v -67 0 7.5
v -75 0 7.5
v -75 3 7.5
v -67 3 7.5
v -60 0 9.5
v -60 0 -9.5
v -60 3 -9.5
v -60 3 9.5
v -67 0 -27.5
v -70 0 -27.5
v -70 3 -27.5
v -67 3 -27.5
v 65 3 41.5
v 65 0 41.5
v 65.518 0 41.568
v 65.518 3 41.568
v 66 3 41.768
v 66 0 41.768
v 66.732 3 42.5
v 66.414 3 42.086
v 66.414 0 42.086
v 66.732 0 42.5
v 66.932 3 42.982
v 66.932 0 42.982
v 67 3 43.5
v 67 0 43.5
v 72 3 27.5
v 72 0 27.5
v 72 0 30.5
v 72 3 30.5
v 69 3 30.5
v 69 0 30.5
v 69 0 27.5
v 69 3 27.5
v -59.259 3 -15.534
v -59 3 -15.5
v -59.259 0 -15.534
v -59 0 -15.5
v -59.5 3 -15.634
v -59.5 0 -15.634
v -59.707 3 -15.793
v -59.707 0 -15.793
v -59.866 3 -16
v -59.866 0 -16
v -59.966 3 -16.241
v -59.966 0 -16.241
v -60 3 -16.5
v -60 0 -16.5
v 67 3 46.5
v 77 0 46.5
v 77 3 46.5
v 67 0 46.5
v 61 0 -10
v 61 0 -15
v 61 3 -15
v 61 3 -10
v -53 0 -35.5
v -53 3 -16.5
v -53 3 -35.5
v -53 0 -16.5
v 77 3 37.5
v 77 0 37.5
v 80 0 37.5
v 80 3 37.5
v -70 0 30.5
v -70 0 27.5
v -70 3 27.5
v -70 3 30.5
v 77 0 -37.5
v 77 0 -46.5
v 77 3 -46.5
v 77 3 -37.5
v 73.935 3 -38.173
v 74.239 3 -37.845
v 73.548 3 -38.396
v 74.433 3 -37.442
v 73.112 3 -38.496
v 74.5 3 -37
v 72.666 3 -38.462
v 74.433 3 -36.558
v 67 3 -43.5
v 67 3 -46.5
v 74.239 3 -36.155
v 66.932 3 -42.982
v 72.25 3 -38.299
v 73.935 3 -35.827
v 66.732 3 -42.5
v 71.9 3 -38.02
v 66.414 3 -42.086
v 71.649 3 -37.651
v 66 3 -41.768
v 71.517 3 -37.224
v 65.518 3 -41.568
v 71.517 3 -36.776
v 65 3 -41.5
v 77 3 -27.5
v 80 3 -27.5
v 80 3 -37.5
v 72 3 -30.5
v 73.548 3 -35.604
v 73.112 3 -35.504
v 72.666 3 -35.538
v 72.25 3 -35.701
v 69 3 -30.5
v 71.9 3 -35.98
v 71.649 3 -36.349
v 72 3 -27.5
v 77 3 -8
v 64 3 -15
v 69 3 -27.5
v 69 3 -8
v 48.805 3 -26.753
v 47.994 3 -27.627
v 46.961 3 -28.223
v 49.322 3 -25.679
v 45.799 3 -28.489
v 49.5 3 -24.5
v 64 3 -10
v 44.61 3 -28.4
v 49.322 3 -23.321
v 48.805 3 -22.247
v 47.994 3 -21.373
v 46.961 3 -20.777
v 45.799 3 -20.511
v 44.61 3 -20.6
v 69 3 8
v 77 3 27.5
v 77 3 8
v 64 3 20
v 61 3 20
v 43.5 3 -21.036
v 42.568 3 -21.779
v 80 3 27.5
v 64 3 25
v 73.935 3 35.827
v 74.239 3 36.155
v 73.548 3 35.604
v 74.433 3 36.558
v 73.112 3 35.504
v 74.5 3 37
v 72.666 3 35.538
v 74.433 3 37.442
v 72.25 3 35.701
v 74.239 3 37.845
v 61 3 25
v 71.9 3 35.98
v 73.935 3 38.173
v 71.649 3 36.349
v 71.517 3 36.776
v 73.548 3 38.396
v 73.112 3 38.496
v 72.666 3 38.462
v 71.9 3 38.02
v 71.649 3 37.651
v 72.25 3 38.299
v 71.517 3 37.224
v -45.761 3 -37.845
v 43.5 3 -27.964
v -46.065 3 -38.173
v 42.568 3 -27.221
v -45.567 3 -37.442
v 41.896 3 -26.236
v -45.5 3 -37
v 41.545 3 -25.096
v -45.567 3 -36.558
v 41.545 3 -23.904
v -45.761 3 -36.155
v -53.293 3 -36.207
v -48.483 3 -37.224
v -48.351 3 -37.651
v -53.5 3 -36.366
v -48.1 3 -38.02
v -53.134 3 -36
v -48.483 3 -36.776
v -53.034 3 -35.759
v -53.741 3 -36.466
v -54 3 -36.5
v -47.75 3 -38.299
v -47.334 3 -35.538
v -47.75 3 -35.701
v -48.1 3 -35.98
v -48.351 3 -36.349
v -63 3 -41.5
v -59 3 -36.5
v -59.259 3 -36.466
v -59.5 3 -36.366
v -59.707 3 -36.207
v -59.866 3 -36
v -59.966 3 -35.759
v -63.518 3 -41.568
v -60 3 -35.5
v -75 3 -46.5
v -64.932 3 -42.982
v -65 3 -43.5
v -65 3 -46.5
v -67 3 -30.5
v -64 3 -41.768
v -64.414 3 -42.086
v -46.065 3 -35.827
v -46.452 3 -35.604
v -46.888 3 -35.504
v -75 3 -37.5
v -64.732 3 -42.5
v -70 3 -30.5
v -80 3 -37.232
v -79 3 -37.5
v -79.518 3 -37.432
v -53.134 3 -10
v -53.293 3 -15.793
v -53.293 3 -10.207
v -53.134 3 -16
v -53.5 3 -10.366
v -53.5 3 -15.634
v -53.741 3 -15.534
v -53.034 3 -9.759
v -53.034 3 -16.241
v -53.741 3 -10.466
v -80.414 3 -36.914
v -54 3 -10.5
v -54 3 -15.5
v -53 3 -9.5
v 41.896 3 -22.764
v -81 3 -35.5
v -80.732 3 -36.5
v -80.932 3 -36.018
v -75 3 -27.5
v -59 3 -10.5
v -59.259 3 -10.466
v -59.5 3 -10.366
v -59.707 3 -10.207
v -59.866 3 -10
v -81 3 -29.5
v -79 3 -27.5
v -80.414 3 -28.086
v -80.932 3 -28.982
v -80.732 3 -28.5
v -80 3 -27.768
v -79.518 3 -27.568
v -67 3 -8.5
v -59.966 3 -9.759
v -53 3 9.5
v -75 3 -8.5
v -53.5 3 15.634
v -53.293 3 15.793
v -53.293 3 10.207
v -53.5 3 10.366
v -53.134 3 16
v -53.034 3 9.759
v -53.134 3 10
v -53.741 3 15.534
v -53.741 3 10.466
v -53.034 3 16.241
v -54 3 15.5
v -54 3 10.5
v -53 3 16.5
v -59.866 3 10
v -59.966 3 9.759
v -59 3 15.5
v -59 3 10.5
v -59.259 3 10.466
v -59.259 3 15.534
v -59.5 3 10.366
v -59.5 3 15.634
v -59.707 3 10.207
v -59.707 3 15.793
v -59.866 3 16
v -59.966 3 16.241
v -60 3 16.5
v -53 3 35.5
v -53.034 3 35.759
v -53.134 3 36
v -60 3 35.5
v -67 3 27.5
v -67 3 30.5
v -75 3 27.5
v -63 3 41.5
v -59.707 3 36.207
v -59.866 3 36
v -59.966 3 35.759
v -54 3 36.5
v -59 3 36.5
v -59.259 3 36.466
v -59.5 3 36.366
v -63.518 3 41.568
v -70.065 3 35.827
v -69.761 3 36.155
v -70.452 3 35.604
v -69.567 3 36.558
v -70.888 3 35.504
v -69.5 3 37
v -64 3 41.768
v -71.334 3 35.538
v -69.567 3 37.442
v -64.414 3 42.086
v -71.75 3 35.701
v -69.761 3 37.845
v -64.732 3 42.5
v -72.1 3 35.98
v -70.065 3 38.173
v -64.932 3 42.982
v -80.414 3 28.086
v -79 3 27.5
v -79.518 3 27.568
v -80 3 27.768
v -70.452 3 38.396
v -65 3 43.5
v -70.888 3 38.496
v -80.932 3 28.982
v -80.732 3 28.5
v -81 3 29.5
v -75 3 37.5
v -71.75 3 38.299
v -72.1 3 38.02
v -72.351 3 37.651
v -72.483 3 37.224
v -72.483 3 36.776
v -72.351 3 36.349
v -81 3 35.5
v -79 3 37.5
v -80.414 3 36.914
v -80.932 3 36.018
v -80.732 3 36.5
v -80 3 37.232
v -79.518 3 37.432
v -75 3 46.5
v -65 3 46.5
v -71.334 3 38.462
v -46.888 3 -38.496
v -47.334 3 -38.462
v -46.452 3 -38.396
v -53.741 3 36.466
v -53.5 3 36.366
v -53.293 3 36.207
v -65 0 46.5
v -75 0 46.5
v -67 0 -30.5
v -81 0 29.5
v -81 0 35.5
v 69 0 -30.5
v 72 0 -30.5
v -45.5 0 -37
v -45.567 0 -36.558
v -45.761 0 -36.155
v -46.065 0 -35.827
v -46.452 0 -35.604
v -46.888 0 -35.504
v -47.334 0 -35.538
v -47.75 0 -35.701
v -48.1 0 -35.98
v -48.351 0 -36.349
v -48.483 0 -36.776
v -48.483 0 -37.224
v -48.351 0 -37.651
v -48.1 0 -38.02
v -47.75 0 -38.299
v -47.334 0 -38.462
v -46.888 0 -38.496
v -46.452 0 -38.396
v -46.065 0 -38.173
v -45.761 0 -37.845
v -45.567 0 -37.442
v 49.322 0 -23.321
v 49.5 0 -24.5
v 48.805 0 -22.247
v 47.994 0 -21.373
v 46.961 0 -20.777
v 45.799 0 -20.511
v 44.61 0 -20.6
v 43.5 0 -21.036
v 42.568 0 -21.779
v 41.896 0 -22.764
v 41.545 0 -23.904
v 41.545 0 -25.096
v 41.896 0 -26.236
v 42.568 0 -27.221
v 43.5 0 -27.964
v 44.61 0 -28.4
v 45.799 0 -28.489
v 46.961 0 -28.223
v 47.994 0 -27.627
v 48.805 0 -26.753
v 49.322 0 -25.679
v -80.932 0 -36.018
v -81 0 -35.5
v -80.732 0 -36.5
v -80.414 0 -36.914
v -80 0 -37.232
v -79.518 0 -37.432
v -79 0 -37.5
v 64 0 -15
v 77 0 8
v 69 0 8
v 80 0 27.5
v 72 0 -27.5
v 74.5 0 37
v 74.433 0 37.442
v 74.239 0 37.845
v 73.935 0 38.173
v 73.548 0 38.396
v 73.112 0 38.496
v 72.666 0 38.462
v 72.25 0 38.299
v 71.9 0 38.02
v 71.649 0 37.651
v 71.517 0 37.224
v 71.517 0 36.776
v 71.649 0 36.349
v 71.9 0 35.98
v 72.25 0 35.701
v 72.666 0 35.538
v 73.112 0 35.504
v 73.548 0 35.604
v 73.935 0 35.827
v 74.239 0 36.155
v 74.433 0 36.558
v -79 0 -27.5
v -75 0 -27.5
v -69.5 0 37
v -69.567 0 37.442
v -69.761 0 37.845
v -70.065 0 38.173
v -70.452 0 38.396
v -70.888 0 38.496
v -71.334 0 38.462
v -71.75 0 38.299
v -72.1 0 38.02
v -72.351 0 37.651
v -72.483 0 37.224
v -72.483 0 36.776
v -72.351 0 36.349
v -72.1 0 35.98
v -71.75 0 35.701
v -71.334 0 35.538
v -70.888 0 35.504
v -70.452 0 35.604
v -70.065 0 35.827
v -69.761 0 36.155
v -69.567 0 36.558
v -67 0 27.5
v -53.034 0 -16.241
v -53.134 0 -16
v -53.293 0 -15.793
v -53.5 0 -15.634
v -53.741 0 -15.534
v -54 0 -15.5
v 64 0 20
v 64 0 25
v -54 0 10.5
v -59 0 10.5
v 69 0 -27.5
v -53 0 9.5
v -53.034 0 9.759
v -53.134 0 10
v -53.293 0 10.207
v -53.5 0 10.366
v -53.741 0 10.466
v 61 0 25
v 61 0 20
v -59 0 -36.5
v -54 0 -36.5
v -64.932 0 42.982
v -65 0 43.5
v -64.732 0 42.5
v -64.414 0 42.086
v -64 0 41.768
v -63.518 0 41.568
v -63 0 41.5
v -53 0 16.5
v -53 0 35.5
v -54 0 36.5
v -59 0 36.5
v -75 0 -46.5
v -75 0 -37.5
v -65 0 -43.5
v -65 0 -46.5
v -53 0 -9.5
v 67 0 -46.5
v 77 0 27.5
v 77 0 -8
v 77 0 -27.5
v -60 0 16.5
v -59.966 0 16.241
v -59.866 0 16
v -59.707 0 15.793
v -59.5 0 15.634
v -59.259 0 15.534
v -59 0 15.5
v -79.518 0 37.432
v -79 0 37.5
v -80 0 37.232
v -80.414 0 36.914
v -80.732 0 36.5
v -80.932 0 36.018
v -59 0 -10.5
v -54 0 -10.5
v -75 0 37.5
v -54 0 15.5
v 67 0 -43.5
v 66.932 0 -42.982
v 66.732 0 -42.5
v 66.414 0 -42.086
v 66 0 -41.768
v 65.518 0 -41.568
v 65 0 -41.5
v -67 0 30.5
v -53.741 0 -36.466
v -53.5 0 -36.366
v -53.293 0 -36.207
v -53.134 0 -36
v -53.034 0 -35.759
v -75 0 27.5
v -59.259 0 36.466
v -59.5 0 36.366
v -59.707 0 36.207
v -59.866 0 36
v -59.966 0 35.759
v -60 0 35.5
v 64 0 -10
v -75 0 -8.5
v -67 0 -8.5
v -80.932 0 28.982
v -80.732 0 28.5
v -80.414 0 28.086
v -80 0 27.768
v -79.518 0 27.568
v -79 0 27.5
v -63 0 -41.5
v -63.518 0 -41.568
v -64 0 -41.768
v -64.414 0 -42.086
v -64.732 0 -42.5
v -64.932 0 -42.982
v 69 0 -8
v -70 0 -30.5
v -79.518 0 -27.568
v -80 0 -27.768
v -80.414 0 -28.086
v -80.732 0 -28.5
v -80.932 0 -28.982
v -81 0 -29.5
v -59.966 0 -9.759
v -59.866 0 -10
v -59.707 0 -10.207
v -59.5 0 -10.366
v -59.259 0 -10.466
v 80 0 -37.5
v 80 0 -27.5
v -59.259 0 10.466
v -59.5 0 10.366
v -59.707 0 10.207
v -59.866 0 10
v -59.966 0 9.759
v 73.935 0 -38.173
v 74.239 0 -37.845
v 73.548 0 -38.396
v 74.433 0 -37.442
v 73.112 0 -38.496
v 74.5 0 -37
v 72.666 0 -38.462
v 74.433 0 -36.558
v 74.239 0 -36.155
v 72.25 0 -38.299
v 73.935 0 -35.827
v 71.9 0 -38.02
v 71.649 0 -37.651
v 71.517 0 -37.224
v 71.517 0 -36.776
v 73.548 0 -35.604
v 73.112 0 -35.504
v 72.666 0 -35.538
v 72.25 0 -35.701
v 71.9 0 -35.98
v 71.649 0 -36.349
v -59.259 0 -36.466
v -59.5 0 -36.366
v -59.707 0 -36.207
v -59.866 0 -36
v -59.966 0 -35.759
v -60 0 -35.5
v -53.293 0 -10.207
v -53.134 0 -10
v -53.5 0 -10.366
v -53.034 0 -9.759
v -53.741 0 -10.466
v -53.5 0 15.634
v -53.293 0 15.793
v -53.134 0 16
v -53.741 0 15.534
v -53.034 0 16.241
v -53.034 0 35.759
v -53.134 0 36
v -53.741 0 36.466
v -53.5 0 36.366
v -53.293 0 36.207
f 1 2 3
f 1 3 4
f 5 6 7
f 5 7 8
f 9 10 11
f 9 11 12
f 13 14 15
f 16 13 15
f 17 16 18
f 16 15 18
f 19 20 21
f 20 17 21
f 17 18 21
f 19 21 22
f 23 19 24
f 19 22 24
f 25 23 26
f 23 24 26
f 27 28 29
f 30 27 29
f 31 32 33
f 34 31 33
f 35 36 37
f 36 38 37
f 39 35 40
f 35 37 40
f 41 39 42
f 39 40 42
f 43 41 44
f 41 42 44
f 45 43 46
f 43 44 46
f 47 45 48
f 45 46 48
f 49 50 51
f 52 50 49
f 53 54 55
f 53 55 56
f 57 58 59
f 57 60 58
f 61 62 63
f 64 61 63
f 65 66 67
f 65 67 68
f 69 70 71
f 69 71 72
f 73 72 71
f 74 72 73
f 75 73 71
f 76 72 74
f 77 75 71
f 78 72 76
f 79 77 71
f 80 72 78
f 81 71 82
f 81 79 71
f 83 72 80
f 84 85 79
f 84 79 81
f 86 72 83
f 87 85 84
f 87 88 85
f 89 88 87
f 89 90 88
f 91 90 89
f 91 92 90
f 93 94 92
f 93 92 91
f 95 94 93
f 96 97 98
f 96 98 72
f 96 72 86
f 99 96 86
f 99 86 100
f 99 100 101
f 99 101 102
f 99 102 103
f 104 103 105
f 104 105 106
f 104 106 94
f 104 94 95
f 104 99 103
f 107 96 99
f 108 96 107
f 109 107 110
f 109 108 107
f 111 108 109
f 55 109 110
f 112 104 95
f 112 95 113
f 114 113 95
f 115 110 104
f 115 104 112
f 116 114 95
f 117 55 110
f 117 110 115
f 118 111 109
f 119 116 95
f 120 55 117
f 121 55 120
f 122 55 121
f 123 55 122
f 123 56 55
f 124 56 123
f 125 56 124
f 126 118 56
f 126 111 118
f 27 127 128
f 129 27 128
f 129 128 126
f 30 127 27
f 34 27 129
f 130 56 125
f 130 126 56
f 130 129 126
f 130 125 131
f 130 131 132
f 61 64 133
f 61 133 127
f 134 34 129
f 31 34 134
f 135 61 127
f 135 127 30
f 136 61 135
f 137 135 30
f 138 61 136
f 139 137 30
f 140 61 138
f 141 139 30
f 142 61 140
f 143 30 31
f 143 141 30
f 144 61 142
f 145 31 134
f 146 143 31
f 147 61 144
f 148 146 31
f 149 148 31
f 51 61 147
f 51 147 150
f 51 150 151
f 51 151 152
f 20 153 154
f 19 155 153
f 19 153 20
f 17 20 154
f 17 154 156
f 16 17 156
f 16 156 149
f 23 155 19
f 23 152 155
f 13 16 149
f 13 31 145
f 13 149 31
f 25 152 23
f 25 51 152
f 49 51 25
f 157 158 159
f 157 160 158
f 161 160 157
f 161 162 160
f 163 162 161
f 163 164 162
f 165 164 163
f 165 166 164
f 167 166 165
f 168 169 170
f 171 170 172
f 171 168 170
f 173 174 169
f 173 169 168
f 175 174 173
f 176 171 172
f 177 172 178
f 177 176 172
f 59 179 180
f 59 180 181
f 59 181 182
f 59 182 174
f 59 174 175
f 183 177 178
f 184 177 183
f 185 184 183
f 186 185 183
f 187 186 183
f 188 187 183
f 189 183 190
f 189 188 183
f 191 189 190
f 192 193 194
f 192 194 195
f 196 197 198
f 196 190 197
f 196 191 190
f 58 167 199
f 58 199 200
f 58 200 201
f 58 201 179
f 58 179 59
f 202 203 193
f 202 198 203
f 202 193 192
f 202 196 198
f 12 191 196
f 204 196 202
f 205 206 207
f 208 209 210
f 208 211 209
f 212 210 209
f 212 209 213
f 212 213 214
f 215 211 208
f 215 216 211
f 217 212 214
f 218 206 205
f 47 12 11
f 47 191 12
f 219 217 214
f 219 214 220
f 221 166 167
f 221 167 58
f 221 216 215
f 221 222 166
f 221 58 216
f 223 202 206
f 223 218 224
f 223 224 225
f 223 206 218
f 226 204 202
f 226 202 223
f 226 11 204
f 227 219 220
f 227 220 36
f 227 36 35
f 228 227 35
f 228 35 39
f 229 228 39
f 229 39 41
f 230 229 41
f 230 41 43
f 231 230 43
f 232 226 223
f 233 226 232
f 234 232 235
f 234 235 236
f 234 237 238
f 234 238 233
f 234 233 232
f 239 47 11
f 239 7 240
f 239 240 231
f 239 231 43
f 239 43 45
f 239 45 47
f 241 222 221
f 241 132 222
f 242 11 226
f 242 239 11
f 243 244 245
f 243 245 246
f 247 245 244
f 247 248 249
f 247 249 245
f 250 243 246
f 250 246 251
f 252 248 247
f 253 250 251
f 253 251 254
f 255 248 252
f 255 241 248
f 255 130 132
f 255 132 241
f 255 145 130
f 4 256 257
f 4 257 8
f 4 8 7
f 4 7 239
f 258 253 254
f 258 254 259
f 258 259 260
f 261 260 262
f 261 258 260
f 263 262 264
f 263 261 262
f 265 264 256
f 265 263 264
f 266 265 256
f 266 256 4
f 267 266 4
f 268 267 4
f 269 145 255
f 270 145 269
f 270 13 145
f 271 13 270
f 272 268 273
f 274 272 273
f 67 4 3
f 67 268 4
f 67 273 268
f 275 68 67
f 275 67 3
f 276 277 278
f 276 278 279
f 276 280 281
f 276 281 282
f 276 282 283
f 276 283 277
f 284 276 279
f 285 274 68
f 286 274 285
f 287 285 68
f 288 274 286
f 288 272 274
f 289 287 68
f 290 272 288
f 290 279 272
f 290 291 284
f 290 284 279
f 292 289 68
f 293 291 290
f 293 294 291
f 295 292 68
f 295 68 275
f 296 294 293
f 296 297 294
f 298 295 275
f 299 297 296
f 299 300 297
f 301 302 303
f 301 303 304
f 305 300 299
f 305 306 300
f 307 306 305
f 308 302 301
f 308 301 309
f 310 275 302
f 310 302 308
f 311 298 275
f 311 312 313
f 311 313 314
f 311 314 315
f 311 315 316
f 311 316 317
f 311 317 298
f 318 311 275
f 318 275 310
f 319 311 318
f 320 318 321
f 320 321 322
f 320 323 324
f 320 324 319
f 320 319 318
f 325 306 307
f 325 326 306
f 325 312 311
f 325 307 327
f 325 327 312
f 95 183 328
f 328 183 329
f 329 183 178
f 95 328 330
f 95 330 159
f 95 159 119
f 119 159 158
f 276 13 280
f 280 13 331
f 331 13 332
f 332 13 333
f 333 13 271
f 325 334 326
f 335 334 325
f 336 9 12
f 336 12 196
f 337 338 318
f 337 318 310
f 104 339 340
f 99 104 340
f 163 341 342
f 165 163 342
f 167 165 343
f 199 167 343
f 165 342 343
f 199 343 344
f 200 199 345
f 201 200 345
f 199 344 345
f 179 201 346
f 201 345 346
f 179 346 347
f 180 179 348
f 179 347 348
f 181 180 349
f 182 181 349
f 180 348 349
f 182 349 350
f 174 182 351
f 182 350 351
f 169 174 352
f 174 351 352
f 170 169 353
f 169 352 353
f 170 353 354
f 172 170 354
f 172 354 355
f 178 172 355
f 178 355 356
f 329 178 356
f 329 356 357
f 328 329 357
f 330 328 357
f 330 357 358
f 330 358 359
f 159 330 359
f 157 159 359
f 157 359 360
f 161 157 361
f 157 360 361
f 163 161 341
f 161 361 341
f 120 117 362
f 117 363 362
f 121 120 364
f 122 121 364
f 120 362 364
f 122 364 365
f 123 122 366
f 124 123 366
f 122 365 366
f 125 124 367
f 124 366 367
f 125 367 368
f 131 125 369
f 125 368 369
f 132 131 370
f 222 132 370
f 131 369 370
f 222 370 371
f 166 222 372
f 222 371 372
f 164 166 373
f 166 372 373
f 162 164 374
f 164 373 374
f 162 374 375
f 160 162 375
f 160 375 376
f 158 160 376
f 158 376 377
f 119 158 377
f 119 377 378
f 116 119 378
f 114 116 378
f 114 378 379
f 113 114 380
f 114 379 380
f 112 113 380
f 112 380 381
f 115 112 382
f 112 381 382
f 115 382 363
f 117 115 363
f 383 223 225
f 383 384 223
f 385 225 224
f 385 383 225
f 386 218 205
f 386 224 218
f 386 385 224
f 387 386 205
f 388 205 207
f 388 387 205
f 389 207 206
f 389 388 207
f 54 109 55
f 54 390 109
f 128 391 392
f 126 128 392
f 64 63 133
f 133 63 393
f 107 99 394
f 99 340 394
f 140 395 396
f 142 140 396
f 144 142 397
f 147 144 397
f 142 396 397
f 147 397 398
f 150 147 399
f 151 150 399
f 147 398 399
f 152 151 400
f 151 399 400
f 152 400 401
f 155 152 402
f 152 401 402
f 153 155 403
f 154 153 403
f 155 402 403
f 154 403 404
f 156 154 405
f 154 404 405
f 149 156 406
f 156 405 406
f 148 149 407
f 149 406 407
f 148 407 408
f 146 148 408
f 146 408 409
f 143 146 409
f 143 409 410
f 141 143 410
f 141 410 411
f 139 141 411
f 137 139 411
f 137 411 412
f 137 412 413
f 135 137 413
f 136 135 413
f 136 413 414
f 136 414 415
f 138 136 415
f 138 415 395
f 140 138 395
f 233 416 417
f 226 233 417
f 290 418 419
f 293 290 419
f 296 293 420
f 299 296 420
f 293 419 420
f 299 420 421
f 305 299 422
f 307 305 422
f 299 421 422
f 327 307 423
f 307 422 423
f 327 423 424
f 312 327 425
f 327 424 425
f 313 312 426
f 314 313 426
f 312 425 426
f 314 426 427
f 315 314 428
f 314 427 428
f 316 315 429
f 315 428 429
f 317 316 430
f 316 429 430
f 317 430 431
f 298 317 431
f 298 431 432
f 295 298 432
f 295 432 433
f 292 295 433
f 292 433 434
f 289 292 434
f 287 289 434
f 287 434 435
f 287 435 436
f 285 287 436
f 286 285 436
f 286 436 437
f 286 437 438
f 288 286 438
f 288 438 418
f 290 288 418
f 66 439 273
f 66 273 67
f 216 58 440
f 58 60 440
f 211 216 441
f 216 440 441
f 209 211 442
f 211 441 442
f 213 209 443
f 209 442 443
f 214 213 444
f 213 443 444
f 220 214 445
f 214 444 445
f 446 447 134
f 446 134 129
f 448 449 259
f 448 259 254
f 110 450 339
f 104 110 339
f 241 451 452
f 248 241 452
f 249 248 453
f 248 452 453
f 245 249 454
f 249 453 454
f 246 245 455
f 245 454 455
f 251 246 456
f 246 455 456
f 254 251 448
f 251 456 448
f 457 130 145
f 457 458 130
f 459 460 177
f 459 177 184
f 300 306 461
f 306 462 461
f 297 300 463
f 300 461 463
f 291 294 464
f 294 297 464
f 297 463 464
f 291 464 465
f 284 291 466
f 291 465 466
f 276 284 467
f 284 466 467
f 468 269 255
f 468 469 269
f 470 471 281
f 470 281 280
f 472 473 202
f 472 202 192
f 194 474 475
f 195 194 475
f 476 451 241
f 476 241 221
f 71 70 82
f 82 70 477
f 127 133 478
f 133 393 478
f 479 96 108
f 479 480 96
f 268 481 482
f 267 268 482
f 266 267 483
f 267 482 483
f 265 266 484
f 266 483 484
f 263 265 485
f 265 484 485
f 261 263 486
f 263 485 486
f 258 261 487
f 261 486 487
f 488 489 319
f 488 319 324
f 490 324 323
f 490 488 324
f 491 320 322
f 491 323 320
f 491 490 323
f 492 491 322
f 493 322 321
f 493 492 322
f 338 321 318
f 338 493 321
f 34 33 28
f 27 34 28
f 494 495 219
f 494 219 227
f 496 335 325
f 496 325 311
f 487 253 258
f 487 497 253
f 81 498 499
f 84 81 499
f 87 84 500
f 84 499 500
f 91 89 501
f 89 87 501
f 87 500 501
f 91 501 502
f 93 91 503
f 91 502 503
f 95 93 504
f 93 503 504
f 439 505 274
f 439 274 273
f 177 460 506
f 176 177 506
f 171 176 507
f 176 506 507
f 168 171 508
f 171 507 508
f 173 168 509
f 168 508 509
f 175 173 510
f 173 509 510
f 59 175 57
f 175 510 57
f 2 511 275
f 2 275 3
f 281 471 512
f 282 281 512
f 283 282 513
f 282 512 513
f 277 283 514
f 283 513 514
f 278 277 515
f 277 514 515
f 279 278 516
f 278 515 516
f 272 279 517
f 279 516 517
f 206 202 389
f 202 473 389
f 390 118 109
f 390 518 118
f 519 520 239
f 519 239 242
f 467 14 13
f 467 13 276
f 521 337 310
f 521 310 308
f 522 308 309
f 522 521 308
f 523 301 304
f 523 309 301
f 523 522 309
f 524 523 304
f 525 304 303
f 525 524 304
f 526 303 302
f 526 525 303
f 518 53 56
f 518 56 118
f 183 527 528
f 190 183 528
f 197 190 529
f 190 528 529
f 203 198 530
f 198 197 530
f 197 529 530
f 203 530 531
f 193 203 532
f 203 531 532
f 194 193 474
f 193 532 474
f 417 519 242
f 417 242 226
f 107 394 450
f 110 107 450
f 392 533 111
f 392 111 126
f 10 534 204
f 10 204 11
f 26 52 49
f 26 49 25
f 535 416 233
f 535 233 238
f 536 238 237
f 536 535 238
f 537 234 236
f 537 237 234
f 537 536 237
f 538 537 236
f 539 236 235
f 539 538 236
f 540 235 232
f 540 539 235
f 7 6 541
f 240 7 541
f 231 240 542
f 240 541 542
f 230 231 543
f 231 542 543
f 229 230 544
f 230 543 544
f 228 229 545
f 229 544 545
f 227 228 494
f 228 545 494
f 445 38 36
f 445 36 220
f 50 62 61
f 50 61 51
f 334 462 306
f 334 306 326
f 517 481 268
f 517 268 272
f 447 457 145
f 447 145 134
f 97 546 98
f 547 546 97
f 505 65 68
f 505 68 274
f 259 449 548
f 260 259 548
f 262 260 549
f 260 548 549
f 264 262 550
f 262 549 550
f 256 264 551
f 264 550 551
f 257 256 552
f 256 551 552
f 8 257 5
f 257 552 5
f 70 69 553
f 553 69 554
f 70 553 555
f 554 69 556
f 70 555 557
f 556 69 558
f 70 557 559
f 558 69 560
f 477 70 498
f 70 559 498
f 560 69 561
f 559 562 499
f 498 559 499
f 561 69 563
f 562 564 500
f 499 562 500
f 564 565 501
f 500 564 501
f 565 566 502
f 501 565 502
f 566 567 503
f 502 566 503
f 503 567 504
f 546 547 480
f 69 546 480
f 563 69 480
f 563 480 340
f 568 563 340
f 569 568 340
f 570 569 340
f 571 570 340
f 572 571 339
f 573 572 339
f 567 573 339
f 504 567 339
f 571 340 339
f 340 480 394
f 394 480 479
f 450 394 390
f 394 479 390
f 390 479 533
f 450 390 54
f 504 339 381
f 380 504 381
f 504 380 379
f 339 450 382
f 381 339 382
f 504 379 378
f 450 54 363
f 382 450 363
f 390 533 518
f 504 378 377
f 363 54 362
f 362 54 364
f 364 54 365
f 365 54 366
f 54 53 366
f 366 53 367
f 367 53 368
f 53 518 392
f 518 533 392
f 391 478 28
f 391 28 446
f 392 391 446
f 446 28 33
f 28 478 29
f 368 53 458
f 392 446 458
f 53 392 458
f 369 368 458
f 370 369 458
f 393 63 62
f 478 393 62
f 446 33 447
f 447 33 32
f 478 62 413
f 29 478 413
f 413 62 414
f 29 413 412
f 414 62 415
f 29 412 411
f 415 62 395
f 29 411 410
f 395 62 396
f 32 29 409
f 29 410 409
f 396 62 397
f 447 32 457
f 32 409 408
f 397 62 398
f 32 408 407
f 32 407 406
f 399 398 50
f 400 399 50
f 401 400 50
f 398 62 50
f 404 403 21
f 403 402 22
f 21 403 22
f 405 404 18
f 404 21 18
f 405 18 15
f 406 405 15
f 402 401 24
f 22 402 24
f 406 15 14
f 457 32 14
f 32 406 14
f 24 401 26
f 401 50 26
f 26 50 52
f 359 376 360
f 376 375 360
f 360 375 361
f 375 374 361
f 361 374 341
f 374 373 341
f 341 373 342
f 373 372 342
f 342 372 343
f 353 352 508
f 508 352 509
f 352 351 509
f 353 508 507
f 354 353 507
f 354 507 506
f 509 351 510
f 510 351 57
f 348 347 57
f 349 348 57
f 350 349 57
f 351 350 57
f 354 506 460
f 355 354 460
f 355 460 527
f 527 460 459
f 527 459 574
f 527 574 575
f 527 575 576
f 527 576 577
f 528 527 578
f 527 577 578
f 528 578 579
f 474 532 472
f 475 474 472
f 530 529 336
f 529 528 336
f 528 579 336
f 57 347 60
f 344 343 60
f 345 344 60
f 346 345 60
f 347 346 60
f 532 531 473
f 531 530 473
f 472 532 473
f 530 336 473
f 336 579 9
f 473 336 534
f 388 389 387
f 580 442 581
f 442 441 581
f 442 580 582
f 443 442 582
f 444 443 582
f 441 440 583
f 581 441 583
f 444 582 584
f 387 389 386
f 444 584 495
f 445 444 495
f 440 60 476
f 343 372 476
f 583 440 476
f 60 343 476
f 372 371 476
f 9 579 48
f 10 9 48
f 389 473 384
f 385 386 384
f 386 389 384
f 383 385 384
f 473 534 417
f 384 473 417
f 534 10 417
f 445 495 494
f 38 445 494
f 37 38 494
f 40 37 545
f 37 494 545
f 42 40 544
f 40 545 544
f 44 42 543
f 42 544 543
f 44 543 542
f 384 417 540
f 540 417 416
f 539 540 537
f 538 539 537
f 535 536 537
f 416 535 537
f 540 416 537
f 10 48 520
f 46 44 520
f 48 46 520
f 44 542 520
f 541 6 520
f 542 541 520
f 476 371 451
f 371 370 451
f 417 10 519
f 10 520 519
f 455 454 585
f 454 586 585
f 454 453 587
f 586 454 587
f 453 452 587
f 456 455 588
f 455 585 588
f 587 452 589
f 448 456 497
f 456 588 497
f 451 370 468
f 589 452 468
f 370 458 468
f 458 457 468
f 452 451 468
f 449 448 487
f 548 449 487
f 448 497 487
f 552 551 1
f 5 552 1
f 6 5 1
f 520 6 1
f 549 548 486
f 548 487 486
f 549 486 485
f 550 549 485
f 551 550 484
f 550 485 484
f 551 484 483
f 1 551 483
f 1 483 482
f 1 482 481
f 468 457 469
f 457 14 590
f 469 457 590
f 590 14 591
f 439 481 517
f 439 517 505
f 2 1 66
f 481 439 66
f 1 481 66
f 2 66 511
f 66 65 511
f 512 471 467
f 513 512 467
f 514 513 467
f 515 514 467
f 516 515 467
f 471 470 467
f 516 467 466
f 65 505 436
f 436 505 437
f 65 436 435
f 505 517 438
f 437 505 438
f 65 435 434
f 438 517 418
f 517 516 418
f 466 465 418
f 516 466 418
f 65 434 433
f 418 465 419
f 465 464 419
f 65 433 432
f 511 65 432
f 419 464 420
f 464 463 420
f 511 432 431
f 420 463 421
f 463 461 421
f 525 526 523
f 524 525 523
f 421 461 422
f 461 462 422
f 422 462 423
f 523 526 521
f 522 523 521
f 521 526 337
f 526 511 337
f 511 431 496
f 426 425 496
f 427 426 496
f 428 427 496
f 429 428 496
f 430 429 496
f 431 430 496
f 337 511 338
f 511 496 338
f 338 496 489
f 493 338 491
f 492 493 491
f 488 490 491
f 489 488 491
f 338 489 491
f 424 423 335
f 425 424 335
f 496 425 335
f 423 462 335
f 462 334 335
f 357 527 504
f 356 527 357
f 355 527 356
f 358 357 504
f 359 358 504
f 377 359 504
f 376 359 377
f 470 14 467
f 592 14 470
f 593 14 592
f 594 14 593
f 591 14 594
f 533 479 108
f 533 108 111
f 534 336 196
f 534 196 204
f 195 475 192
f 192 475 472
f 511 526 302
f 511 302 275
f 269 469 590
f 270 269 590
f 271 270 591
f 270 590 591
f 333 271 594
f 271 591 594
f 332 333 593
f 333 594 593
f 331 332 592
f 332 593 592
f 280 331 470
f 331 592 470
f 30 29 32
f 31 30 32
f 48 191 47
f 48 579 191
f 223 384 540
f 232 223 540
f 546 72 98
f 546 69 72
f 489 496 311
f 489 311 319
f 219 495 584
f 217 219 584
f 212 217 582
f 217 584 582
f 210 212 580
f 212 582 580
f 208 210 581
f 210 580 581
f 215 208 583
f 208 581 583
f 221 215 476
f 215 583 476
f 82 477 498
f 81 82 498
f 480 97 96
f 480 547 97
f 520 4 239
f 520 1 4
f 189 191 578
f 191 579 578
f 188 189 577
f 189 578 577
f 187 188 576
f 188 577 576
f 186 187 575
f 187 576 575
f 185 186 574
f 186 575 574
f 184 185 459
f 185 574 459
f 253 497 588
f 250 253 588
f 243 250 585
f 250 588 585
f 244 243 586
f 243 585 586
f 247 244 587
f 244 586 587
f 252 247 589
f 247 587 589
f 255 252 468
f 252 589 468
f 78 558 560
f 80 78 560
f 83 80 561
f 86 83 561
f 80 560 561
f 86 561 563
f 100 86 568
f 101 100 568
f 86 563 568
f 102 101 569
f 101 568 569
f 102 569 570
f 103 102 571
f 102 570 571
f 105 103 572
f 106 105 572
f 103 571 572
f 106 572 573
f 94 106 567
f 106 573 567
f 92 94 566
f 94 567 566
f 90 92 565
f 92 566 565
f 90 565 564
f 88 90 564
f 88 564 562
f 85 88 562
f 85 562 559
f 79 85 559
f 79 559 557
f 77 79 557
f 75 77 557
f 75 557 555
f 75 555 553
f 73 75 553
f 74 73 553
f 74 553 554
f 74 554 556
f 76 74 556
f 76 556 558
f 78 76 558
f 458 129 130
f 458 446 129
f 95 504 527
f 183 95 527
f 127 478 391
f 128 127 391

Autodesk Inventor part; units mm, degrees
ref_plane "YZ Plane" through (0, 0, 0) normal (1, 0, 0) x (0, 1, 0)
ref_plane "XZ Plane" through (0, 0, 0) normal (0, 1, 0) x (-1, 0, 0)
ref_plane "XY Plane" through (0, 0, 0) normal (0, 0, 1) x (1, 0, 0)
sketch "Sketch1" plane through (0, 0, 0) normal (0, 1, 0) x (-1, 0, 0)
  line L0 (-77, 37.5) -> (-80, 37.5)
  line L1 (-80, 27.5) -> (-77, 27.5)
  line L2 (-77, 27.5) -> (-77, 8)
  line L3 (-77, 8) -> (-69, 8)
  line L4 (-77, -37.5) -> (-80, -37.5)
  line L5 (-80, -27.5) -> (-77, -27.5)
  line L6 (-77, -27.5) -> (-77, -8)
  line L7 (-77, -8) -> (-69, -8)
  line L8 (-69, -8) -> (-69, 8)
  line L9 (-80, 37.5) -> (-80, 27.5)
  line L10 (-80, -37.5) -> (-80, -27.5)
  line L11 (75, 37.5) -> (79, 37.5)
  line L12 (81, 35.5) -> (81, 29.5)
  line L13 (79, 27.5) -> (75, 27.5)
  line L14 (75, -37.5) -> (79, -37.5)
  line L15 (81, -35.5) -> (81, -29.5)
  line L16 (79, -27.5) -> (75, -27.5)
  line L17 (75, 46.5) -> (75, 37.5)
  line L18 (75, -37.5) -> (75, -46.5)
  line L19 (-77, 37.5) -> (-77, 46.5)
  line L20 (-77, -46.5) -> (-77, -37.5)
  arc A0 (81, 35.5) -> (79, 37.5) centre (79, 35.5) ccw
  arc A1 (79, 27.5) -> (81, 29.5) centre (79, 29.5) ccw
  arc A2 (81, -29.5) -> (79, -27.5) centre (79, -29.5) ccw
  arc A3 (79, -37.5) -> (81, -35.5) centre (79, -35.5) ccw
  line L21 (75, 7.5) -> (67, 7.5)
  line L22 (67, 7.5) -> (67, -8.5)
  line L23 (67, -8.5) -> (75, -8.5)
  line L24 (75, 27.5) -> (75, 7.5)
  line L25 (75, -8.5) -> (75, -27.5)
  line L26 (-67, 46.5) -> (-67, 43.5)
  line L27 (-65, 41.5) -> (63, 41.5)
  line L28 (65, 43.5) -> (65, 46.5)
  line L29 (-77, 46.5) -> (-67, 46.5)
  line L30 (65, 46.5) -> (75, 46.5)
  line L31 (-67, -46.5) -> (-67, -43.5)
  line L32 (-65, -41.5) -> (63, -41.5)
  line L33 (65, -43.5) -> (65, -46.5)
  line L34 (-77, -46.5) -> (-67, -46.5)
  line L35 (65, -46.5) -> (75, -46.5)
  arc A4 (65, -43.5) -> (63, -41.5) centre (63, -43.5) ccw
  arc A5 (-65, -41.5) -> (-67, -43.5) centre (-65, -43.5) ccw
  arc A6 (-67, 43.5) -> (-65, 41.5) centre (-65, 43.5) ccw
  arc A7 (63, 41.5) -> (65, 43.5) centre (63, 43.5) ccw
  point P0 (0, 0)
  point P1 (81, 37.5)
  point P2 (81, 27.5)
  point P3 (81, -37.5)
  point P4 (81, -27.5)
  point P5 (-67, 41.5)
  point P6 (-67, -41.5)
  dimension "d5" = 10
  dimension "d20" = 3
  dimension "d43" = 3
  dimension "d44" = 8
  dimension "d49" = 10
  dimension "d50" = 10
  dimension "d53" = 6
  dimension "d54" = 6
  dimension "d74" = 2
  dimension "d75" = 8
  dimension "d76" = 8
  dimension "d77" = 16
  dimension "d89" = 8
  dimension "d113" = 5
  dimension "d114" = 10
  dimension "d115" = 10
  dimension "d116" = 5
  dimension "d117" = 10
  dimension "d118" = 10
  dimension "d119" = 2
  dimension "d120" = 6
  dimension "d124" = 41.5
  dimension "d127" = 6
  dimension "d128" = 80
  dimension "d129" = 3
  dimension "d130" = 132
  dimension "d133" = 3
  dimension "d135" = 33
  dimension "d136" = 93
  dimension "d140" = 16
  dimension "d142" = 8
  dimension "d144" = 10
  dimension "d145" = 5
  dimension "d146" = 5
  dimension "d147" = 27.5
  dimension "d148" = 27.5
  dimension "d149" = 27.5
  dimension "d150" = 27.5
  dimension "d164" = 161
extrude "Extrusion1" add sketch "Sketch1" along normal blind 3
sketch "Sketch2" plane through (0, 0, 0) normal (0, -1, 0) x (1, 0, 0)
  line L0 (77, 46.5) -> (77, 37.5) projected
  line L1 (-75, 7.5) -> (-75, 27.5) projected
  line L2 (-75, -27.5) -> (-75, -8.5) projected
  line L3 (-70, 30.5) -> (-67, 30.5)
  line L4 (-67, 30.5) -> (-67, 27.5)
  line L5 (-67, 27.5) -> (-70, 27.5)
  line L6 (-70, 27.5) -> (-70, 30.5)
  line L7 (-70, -27.5) -> (-67, -27.5)
  line L8 (-67, -27.5) -> (-67, -30.5)
  line L9 (-67, -30.5) -> (-70, -30.5)
  line L10 (-70, -30.5) -> (-70, -27.5)
  line L11 (77, -37.5) -> (77, -46.5) projected
  line L12 (69, 27.5) -> (72, 27.5)
  line L13 (72, 27.5) -> (72, 30.5)
  line L14 (72, 30.5) -> (69, 30.5)
  line L15 (69, 30.5) -> (69, 27.5)
  line L16 (69, -30.5) -> (72, -30.5)
  line L17 (72, -30.5) -> (72, -27.5)
  line L18 (72, -27.5) -> (69, -27.5)
  line L19 (69, -27.5) -> (69, -30.5)
  line L20 (77, -8) -> (77, -27.5) projected
  line L21 (77, 27.5) -> (77, 8) projected
  line L22 (61, 25) -> (64, 25)
  line L23 (64, 25) -> (64, 20)
  line L24 (64, 20) -> (61, 20)
  line L25 (61, 20) -> (61, 25)
  line L26 (61, -10) -> (64, -10)
  line L27 (64, -10) -> (64, -15)
  line L28 (64, -15) -> (61, -15)
  line L29 (61, -15) -> (61, -10)
  line L30 (65, -41.5) -> (-63, -41.5) projected
  point P0 (0, 0)
  dimension "d79" = 3
  dimension "d80" = 3
  dimension "d81" = 3
  dimension "d82" = 3
  dimension "d83" = 5
  dimension "d84" = 5
  dimension "d85" = 27.5
  dimension "d86" = 27.5
  dimension "d90" = 5
  dimension "d91" = 5
  dimension "d92" = 27.5
  dimension "d93" = 27.5
  dimension "d94" = 3
  dimension "d95" = 3
  dimension "d96" = 3
  dimension "d97" = 3
  dimension "d151" = 5
  dimension "d152" = 3
  dimension "d153" = 5
  dimension "d154" = 3
  dimension "d155" = 30
  dimension "d161" = 16
  dimension "d162" = 16
  dimension "d165" = 31.5
extrude "Extrusion5" cut sketch "Sketch2" against normal through all
sketch "Sketch4" plane through (0, 0, 0) normal (0, -1, 0) x (1, 0, 0)
  line L0 (-63, 41.5) -> (65, 41.5) projected
  line L1 (-75, 37.5) -> (-75, 46.5) projected
  line L2 (65, -41.5) -> (-63, -41.5) projected
  line L3 (77, -8) -> (77, -27.5) projected
  circle A0 centre (45.5, -24.5) radius 4
  circle A1 centre (73, 37) radius 1.5
  circle A2 centre (-71, 37) radius 1.5
  circle A3 centre (73, -37) radius 1.5
  line L4 (-75, 7.5) -> (-75, 27.5) projected
  line L5 (-75, -27.5) -> (-75, -8.5) projected
  line L6 (-59, 36.5) -> (-54, 36.5)
  line L7 (-53, 35.5) -> (-53, 16.5)
  line L8 (-54, 15.5) -> (-59, 15.5)
  line L9 (-60, 16.5) -> (-60, 35.5)
  line L10 (-59, 10.5) -> (-54, 10.5)
  line L11 (-53, 9.5) -> (-53, -9.5)
  line L12 (-54, -10.5) -> (-59, -10.5)
  line L13 (-60, -9.5) -> (-60, 9.5)
  line L14 (-59, -15.5) -> (-54, -15.5)
  line L15 (-53, -16.5) -> (-53, -35.5)
  line L16 (-54, -36.5) -> (-59, -36.5)
  line L17 (-60, -35.5) -> (-60, -16.5)
  arc A4 (-59, 36.5) -> (-60, 35.5) centre (-59, 35.5) ccw
  arc A5 (-53, 35.5) -> (-54, 36.5) centre (-54, 35.5) ccw
  arc A6 (-54, 15.5) -> (-53, 16.5) centre (-54, 16.5) ccw
  arc A7 (-60, 16.5) -> (-59, 15.5) centre (-59, 16.5) ccw
  arc A8 (-59, 10.5) -> (-60, 9.5) centre (-59, 9.5) ccw
  arc A9 (-53, 9.5) -> (-54, 10.5) centre (-54, 9.5) ccw
  arc A10 (-54, -10.5) -> (-53, -9.5) centre (-54, -9.5) ccw
  arc A11 (-60, -9.5) -> (-59, -10.5) centre (-59, -9.5) ccw
  arc A12 (-59, -15.5) -> (-60, -16.5) centre (-59, -16.5) ccw
  arc A13 (-53, -16.5) -> (-54, -15.5) centre (-54, -16.5) ccw
  arc A14 (-54, -36.5) -> (-53, -35.5) centre (-54, -35.5) ccw
  arc A15 (-60, -35.5) -> (-59, -36.5) centre (-59, -35.5) ccw
  circle A16 centre (-47, -37) radius 1.5
  point P0 (0, 0)
  point P1 (-53, 15.5)
  point P2 (-53, 36.5)
  point P3 (-60, 15.5)
  point P4 (-53, -10.5)
  point P5 (-53, 10.5)
  point P6 (-60, -10.5)
  point P7 (-53, -36.5)
  point P8 (-53, -15.5)
  point P9 (-60, -36.5)
  dimension "d167" = 17
  dimension "d168" = 8
  dimension "d169" = 3
  dimension "d170" = 3
  dimension "d171" = 144
  dimension "d172" = 4
  dimension "d173" = 31.5
  dimension "d176" = 3
  dimension "d177" = 74
  dimension "d179" = 4.5
  dimension "d181" = 4.5
  dimension "d184" = 4.5
  dimension "d185" = 21
  dimension "d186" = 7
  dimension "d187" = 15
  dimension "d188" = 5
  dimension "d189" = 21
  dimension "d190" = 7
  dimension "d191" = 5
  dimension "d192" = 15
  dimension "d193" = 21
  dimension "d194" = 5
  dimension "d195" = 15
  dimension "d196" = 7
  dimension "d197" = 1
  dimension "d200" = 3
  dimension "d201" = 4.5
  dimension "d202" = 24
extrude "Extrusion8" cut sketch "Sketch4" against normal blind 10
properties part number "Main Platform 25100813"
